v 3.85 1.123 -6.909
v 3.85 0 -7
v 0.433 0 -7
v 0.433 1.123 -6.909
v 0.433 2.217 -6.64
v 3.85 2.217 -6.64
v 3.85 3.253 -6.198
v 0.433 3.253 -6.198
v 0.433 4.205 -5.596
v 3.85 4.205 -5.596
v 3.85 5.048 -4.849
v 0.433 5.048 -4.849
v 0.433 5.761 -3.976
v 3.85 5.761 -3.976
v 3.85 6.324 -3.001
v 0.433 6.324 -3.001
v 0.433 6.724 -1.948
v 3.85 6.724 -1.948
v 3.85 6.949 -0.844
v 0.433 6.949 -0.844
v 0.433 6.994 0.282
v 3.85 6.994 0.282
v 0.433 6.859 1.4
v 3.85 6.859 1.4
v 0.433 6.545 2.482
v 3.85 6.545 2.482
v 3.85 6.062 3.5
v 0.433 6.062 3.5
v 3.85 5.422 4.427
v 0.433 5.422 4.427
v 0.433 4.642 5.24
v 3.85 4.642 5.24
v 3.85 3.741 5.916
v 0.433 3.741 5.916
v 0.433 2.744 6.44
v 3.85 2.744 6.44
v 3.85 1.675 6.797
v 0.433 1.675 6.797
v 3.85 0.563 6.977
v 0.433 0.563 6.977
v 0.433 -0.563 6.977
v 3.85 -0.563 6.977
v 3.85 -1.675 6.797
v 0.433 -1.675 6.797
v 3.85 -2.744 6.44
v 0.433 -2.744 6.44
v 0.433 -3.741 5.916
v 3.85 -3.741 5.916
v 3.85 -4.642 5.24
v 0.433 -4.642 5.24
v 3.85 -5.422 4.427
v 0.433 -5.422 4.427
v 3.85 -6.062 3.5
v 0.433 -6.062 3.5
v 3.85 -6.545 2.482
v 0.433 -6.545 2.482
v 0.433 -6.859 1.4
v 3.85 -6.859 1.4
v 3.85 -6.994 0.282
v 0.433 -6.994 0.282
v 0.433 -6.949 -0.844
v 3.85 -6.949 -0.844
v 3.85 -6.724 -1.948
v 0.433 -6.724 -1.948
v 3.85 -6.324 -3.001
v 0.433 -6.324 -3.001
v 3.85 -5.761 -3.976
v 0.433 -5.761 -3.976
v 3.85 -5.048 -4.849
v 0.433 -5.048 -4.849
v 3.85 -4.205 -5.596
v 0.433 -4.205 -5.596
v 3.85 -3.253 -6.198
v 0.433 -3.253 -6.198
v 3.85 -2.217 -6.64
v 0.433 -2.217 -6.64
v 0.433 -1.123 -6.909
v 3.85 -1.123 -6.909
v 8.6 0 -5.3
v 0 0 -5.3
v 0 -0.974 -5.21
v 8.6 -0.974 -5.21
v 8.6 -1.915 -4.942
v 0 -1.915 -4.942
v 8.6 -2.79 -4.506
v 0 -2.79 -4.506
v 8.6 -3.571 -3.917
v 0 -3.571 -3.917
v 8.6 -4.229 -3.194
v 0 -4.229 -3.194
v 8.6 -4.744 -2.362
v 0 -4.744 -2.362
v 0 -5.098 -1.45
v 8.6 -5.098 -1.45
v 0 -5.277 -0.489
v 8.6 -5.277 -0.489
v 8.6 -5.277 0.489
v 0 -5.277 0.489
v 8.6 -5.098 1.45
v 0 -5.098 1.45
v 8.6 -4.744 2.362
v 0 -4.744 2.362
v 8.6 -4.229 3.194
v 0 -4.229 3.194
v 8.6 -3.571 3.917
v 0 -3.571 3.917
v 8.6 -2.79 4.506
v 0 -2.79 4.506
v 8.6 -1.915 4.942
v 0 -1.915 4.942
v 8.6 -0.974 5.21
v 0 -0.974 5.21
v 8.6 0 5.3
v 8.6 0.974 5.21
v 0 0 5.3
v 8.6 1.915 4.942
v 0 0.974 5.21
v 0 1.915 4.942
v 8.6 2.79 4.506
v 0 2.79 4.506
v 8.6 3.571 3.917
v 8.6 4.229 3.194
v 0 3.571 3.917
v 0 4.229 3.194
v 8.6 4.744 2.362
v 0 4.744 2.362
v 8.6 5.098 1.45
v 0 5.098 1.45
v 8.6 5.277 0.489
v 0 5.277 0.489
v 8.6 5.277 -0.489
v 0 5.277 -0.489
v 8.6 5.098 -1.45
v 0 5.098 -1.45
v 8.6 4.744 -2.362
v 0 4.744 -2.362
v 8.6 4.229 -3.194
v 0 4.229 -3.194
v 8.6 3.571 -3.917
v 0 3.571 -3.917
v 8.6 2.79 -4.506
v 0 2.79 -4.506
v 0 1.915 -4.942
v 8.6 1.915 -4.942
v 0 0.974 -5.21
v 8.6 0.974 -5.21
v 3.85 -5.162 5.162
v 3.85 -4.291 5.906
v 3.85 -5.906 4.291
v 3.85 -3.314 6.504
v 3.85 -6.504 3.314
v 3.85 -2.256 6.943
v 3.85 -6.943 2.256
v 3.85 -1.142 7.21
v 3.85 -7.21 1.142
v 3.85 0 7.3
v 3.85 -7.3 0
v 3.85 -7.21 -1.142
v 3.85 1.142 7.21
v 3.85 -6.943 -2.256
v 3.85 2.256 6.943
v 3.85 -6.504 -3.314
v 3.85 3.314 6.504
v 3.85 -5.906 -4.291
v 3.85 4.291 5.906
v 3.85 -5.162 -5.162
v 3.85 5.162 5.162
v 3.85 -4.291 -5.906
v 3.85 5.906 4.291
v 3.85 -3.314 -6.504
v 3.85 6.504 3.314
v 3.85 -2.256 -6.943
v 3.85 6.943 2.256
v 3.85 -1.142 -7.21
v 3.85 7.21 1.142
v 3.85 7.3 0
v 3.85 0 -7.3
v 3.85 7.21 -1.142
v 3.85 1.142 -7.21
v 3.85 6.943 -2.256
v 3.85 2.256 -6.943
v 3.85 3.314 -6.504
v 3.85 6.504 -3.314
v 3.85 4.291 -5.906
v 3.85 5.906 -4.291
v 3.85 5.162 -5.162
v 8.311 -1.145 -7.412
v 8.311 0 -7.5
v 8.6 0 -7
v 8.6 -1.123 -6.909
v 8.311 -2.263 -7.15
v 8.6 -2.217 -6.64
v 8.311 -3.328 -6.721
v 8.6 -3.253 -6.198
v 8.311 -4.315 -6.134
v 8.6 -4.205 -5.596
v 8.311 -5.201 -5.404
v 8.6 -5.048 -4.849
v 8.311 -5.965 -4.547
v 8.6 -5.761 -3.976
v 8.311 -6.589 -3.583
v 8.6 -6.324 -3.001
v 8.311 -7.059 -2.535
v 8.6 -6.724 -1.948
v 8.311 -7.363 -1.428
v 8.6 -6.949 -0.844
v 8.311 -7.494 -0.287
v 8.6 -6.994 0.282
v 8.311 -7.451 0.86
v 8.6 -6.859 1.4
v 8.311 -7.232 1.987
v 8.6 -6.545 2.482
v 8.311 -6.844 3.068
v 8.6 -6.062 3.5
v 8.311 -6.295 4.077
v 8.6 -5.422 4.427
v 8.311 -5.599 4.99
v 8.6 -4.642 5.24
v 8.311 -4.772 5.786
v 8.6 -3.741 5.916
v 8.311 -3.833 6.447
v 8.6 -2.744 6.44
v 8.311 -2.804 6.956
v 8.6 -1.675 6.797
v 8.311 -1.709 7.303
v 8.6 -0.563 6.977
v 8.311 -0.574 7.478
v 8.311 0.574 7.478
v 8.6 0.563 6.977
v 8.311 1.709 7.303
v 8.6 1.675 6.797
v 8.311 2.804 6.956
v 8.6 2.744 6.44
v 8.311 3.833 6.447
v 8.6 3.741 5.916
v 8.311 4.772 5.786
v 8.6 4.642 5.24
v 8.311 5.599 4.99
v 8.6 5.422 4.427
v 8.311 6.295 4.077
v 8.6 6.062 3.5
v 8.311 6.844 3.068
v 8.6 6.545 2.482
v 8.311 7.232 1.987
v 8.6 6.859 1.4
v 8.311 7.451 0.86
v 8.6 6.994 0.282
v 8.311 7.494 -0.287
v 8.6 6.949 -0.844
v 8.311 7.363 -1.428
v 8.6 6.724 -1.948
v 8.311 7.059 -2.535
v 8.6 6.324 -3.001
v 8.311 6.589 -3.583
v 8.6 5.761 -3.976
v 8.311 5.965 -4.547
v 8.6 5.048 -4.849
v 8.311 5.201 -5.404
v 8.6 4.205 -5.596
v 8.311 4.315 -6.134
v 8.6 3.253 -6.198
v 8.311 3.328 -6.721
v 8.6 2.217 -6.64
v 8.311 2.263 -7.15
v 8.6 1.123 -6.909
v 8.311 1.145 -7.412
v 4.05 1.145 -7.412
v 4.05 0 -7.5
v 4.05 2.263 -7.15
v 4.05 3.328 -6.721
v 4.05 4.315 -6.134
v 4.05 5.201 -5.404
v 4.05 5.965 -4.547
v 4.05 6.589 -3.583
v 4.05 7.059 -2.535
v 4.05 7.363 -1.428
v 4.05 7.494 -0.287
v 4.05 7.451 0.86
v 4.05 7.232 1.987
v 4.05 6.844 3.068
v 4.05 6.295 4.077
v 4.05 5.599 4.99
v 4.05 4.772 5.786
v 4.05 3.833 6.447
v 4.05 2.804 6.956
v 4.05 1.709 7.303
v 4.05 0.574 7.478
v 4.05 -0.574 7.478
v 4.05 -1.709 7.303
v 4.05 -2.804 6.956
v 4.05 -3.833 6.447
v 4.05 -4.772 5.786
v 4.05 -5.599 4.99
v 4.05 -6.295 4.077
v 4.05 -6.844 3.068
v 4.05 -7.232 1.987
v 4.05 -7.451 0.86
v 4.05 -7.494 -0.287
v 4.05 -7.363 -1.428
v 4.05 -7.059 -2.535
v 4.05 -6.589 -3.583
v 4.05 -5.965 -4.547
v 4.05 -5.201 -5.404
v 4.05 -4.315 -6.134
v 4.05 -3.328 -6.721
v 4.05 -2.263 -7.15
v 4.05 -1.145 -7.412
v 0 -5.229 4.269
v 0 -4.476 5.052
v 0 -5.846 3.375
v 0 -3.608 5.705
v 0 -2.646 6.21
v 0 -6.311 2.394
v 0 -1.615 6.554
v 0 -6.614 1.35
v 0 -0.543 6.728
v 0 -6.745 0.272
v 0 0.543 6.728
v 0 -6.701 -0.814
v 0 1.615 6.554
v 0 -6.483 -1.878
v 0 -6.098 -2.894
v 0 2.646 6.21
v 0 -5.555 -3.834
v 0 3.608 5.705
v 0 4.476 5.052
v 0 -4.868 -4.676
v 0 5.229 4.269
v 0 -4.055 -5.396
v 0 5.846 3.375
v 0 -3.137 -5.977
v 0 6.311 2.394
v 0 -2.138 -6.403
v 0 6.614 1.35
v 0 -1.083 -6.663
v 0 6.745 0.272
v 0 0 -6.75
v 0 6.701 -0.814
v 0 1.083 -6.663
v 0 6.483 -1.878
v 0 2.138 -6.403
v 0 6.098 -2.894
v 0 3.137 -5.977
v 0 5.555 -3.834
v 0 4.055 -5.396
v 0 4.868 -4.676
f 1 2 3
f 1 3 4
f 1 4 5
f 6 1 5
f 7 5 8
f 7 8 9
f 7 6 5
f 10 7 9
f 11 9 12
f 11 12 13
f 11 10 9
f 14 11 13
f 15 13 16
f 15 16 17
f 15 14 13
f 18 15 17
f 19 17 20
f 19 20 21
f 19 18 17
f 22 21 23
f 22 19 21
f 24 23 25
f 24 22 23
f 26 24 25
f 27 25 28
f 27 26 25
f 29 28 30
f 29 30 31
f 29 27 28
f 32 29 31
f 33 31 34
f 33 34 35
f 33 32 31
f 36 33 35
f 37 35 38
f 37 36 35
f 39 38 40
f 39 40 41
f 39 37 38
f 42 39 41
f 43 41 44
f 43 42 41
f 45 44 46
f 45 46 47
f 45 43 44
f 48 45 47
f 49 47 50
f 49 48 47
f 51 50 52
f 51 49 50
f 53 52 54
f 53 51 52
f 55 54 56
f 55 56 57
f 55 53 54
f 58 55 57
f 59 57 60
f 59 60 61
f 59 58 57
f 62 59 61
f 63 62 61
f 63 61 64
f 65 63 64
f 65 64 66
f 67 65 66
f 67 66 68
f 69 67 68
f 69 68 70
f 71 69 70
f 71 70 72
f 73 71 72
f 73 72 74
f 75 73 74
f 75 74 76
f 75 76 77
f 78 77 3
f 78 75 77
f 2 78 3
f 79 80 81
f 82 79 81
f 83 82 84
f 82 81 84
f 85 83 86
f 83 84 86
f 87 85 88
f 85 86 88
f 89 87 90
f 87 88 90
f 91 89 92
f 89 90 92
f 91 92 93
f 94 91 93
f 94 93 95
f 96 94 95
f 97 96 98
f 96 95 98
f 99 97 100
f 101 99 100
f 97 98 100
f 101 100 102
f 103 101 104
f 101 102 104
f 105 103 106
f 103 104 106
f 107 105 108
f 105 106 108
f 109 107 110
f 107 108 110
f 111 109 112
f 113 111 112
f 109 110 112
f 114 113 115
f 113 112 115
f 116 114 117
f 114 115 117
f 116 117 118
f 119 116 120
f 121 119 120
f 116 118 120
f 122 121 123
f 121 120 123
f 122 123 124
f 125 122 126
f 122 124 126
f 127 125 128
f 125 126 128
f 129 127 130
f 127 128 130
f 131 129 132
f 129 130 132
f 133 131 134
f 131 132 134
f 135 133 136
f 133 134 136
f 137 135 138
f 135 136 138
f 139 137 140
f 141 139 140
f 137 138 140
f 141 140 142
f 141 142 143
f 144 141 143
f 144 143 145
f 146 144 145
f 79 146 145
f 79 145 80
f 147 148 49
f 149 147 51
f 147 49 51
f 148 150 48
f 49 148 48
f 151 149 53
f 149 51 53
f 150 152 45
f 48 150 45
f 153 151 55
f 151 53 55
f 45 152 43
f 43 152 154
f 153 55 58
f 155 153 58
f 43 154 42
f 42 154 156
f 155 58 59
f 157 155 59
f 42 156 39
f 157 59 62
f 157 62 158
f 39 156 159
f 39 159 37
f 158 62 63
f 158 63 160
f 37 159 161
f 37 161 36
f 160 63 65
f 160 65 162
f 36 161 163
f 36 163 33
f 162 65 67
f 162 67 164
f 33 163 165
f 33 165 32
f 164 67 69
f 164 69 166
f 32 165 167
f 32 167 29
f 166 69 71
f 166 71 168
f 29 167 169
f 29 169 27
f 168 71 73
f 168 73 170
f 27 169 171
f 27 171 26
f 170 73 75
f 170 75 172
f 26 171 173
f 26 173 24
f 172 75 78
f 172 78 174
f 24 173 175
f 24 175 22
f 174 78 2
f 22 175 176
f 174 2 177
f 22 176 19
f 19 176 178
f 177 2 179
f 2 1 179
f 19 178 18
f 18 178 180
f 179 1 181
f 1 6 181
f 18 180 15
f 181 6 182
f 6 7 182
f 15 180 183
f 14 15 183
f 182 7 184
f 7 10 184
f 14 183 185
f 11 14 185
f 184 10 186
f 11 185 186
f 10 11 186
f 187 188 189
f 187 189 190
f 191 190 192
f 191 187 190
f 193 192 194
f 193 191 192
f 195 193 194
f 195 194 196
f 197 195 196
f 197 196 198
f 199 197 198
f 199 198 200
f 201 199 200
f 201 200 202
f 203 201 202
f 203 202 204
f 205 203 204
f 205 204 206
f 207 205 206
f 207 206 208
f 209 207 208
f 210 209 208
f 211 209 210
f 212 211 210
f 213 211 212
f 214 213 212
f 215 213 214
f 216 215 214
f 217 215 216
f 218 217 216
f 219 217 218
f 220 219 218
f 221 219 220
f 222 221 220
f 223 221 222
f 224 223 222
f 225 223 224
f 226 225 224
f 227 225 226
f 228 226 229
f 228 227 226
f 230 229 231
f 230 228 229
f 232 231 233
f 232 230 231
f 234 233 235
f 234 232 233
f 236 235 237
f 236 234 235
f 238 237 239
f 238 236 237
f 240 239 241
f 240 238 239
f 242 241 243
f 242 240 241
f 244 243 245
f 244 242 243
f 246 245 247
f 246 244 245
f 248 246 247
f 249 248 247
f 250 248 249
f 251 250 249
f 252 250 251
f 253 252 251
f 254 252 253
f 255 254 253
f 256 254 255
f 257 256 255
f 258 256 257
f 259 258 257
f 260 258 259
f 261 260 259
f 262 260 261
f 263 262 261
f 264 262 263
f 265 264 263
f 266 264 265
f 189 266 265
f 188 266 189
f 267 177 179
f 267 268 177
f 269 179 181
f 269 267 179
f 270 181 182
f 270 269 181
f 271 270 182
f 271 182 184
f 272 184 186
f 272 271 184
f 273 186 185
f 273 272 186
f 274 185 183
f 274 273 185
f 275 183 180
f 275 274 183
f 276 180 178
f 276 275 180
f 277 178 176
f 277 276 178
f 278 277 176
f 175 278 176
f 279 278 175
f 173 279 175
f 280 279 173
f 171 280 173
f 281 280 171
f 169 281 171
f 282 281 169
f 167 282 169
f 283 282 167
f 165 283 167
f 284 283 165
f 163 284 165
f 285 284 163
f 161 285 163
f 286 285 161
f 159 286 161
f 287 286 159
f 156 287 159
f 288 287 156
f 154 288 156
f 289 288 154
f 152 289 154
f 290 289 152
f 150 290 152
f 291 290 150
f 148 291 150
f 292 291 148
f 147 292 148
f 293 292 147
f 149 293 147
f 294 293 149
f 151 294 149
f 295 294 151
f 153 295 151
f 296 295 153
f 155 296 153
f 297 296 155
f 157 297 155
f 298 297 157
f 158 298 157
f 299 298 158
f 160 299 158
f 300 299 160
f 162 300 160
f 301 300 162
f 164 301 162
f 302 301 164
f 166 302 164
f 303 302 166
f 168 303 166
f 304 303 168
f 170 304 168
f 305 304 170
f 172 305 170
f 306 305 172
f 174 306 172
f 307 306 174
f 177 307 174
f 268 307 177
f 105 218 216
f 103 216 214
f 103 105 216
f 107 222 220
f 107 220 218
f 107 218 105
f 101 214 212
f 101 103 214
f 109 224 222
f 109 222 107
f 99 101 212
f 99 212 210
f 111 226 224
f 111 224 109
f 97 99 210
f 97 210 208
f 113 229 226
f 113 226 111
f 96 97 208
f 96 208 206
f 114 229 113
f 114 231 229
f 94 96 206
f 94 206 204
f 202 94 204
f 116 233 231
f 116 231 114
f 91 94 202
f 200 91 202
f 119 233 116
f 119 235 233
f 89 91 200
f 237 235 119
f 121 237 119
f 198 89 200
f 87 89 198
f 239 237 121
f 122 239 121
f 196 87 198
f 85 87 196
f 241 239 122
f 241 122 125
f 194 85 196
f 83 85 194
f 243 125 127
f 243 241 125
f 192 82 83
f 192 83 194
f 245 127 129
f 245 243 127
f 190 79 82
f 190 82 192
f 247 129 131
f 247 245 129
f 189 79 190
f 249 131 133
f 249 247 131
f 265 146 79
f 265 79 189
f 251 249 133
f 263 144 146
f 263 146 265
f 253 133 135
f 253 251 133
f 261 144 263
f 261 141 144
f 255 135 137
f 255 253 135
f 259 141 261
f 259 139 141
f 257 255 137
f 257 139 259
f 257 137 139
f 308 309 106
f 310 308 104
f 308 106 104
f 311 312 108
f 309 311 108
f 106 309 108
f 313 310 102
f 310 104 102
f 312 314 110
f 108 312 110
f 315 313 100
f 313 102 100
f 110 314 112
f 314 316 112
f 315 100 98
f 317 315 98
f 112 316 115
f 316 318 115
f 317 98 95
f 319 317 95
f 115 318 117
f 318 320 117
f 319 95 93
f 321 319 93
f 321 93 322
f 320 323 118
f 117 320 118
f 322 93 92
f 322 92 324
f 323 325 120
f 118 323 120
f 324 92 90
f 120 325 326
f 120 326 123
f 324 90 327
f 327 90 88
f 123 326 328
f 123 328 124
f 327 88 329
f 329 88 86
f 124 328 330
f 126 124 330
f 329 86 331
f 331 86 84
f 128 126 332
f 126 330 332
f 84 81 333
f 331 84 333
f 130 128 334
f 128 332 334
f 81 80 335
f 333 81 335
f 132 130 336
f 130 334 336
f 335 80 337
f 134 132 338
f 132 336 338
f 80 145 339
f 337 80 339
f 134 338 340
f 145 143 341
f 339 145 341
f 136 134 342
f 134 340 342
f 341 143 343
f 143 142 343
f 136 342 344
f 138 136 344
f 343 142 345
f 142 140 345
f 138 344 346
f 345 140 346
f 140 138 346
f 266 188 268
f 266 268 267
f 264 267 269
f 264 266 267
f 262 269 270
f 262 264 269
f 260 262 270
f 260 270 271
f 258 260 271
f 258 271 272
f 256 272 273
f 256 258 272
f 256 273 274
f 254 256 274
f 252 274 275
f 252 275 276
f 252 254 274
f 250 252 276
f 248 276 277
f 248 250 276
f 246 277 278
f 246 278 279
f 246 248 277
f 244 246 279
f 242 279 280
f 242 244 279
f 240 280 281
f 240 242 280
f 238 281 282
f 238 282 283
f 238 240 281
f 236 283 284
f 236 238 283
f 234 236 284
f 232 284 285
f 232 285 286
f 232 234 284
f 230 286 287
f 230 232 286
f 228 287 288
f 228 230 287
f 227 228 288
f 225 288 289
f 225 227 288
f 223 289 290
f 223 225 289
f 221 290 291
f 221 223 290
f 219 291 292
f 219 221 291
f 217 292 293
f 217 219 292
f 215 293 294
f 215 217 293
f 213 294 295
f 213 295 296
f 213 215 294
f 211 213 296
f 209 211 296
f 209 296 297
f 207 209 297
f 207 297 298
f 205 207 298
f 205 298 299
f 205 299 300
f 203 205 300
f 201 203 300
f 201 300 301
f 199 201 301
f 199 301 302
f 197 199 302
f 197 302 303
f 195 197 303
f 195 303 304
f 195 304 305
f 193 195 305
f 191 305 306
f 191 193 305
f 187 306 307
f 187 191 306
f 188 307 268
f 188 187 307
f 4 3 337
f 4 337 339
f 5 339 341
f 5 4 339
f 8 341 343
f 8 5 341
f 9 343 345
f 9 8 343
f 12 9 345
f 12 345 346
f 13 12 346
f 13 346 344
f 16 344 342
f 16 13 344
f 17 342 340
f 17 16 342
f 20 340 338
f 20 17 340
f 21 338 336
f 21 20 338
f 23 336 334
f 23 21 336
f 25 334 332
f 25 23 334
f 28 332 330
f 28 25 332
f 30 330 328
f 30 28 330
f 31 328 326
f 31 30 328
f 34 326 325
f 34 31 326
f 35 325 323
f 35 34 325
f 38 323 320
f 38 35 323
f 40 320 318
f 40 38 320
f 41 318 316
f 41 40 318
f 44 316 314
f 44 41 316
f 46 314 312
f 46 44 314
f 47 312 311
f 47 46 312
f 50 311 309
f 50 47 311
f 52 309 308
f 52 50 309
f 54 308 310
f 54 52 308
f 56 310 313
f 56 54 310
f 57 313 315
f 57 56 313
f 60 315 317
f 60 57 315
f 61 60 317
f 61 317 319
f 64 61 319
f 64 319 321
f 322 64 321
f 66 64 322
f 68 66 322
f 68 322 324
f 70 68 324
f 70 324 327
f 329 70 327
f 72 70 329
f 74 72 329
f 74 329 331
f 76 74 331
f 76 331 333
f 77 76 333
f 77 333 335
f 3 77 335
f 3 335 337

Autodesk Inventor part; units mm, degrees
sketch "Sketch_1" plane through (0, 0, 0) normal (0, 1, 0) x (-1, 0, 0)
  line L0 (-8.6, 0) -> (0, 0)
  line L1 (0, 0) -> (0, -7.5)
  line L2 (0, -7.5) -> (-8.3113, -7.5)
  line L3 (-8.3113, -7.5) -> (-8.6, -7)
  line L4 (-8.6, -7) -> (-8.6, 0)
  line L5 (-8.6, 0) -> (0, 0)
revolve "Revolution1" add sketch "Sketch_1" angle 360 about axis through (8.6, 0, 0) along (1, 0, 0)
sketch "Sketch_2" plane through (0, 0, 0) normal (0, 1, 0) x (-1, 0, 0)
  line L0 (-50, 0) -> (50, 0)
  line L1 (0, -6.75) -> (-0.433, -7)
  line L2 (-0.433, -7) -> (-3.85, -7)
  line L3 (-3.85, -7) -> (-3.85, -7.5)
  line L4 (-3.85, -7.5) -> (0, -7.5)
  line L5 (0, -7.5) -> (0, -6.75)
revolve "Revolution2" cut sketch "Sketch_2" angle 360 about axis through (50, 0, 0) along (1, 0, 0)
sketch "Sketch_3" plane through (0, 0, 0) normal (0, 1, 0) x (-1, 0, 0)
  line L0 (-50, 0) -> (50, 0)
  line L1 (-3.85, -7.5) -> (-3.85, -7.3)
  line L2 (-3.85, -7.3) -> (-4.05, -7.5)
  line L3 (-4.05, -7.5) -> (-3.85, -7.5)
revolve "Revolution3" cut sketch "Sketch_3" angle 360 about axis through (50, 0, 0) along (1, 0, 0)
sketch "Sketch4" plane through (8.6, 0, 0) normal (1, 0, 0) x (0, 0, -1)
  point P0 (0, 0)
hole "Hole1" at (8.6, 0, 0) direction (-1, 0, 0) diameter 10.6 depth 8.6
ref_plane "gba_XY" through (8.6, 0, 0) normal (1, 0, 0) x (0, 0, -1)
ref_plane "gba_YZ" through (8.6, 0, 0) normal (0, 0, -1) x (0, 1, 0)
ref_plane "gba_ZX" through (8.6, 0, 0) normal (0, 1, 0) x (1, 0, 0)
properties part number "SCHUNK-9951430 Zentrierhuelse PGN-plus"
